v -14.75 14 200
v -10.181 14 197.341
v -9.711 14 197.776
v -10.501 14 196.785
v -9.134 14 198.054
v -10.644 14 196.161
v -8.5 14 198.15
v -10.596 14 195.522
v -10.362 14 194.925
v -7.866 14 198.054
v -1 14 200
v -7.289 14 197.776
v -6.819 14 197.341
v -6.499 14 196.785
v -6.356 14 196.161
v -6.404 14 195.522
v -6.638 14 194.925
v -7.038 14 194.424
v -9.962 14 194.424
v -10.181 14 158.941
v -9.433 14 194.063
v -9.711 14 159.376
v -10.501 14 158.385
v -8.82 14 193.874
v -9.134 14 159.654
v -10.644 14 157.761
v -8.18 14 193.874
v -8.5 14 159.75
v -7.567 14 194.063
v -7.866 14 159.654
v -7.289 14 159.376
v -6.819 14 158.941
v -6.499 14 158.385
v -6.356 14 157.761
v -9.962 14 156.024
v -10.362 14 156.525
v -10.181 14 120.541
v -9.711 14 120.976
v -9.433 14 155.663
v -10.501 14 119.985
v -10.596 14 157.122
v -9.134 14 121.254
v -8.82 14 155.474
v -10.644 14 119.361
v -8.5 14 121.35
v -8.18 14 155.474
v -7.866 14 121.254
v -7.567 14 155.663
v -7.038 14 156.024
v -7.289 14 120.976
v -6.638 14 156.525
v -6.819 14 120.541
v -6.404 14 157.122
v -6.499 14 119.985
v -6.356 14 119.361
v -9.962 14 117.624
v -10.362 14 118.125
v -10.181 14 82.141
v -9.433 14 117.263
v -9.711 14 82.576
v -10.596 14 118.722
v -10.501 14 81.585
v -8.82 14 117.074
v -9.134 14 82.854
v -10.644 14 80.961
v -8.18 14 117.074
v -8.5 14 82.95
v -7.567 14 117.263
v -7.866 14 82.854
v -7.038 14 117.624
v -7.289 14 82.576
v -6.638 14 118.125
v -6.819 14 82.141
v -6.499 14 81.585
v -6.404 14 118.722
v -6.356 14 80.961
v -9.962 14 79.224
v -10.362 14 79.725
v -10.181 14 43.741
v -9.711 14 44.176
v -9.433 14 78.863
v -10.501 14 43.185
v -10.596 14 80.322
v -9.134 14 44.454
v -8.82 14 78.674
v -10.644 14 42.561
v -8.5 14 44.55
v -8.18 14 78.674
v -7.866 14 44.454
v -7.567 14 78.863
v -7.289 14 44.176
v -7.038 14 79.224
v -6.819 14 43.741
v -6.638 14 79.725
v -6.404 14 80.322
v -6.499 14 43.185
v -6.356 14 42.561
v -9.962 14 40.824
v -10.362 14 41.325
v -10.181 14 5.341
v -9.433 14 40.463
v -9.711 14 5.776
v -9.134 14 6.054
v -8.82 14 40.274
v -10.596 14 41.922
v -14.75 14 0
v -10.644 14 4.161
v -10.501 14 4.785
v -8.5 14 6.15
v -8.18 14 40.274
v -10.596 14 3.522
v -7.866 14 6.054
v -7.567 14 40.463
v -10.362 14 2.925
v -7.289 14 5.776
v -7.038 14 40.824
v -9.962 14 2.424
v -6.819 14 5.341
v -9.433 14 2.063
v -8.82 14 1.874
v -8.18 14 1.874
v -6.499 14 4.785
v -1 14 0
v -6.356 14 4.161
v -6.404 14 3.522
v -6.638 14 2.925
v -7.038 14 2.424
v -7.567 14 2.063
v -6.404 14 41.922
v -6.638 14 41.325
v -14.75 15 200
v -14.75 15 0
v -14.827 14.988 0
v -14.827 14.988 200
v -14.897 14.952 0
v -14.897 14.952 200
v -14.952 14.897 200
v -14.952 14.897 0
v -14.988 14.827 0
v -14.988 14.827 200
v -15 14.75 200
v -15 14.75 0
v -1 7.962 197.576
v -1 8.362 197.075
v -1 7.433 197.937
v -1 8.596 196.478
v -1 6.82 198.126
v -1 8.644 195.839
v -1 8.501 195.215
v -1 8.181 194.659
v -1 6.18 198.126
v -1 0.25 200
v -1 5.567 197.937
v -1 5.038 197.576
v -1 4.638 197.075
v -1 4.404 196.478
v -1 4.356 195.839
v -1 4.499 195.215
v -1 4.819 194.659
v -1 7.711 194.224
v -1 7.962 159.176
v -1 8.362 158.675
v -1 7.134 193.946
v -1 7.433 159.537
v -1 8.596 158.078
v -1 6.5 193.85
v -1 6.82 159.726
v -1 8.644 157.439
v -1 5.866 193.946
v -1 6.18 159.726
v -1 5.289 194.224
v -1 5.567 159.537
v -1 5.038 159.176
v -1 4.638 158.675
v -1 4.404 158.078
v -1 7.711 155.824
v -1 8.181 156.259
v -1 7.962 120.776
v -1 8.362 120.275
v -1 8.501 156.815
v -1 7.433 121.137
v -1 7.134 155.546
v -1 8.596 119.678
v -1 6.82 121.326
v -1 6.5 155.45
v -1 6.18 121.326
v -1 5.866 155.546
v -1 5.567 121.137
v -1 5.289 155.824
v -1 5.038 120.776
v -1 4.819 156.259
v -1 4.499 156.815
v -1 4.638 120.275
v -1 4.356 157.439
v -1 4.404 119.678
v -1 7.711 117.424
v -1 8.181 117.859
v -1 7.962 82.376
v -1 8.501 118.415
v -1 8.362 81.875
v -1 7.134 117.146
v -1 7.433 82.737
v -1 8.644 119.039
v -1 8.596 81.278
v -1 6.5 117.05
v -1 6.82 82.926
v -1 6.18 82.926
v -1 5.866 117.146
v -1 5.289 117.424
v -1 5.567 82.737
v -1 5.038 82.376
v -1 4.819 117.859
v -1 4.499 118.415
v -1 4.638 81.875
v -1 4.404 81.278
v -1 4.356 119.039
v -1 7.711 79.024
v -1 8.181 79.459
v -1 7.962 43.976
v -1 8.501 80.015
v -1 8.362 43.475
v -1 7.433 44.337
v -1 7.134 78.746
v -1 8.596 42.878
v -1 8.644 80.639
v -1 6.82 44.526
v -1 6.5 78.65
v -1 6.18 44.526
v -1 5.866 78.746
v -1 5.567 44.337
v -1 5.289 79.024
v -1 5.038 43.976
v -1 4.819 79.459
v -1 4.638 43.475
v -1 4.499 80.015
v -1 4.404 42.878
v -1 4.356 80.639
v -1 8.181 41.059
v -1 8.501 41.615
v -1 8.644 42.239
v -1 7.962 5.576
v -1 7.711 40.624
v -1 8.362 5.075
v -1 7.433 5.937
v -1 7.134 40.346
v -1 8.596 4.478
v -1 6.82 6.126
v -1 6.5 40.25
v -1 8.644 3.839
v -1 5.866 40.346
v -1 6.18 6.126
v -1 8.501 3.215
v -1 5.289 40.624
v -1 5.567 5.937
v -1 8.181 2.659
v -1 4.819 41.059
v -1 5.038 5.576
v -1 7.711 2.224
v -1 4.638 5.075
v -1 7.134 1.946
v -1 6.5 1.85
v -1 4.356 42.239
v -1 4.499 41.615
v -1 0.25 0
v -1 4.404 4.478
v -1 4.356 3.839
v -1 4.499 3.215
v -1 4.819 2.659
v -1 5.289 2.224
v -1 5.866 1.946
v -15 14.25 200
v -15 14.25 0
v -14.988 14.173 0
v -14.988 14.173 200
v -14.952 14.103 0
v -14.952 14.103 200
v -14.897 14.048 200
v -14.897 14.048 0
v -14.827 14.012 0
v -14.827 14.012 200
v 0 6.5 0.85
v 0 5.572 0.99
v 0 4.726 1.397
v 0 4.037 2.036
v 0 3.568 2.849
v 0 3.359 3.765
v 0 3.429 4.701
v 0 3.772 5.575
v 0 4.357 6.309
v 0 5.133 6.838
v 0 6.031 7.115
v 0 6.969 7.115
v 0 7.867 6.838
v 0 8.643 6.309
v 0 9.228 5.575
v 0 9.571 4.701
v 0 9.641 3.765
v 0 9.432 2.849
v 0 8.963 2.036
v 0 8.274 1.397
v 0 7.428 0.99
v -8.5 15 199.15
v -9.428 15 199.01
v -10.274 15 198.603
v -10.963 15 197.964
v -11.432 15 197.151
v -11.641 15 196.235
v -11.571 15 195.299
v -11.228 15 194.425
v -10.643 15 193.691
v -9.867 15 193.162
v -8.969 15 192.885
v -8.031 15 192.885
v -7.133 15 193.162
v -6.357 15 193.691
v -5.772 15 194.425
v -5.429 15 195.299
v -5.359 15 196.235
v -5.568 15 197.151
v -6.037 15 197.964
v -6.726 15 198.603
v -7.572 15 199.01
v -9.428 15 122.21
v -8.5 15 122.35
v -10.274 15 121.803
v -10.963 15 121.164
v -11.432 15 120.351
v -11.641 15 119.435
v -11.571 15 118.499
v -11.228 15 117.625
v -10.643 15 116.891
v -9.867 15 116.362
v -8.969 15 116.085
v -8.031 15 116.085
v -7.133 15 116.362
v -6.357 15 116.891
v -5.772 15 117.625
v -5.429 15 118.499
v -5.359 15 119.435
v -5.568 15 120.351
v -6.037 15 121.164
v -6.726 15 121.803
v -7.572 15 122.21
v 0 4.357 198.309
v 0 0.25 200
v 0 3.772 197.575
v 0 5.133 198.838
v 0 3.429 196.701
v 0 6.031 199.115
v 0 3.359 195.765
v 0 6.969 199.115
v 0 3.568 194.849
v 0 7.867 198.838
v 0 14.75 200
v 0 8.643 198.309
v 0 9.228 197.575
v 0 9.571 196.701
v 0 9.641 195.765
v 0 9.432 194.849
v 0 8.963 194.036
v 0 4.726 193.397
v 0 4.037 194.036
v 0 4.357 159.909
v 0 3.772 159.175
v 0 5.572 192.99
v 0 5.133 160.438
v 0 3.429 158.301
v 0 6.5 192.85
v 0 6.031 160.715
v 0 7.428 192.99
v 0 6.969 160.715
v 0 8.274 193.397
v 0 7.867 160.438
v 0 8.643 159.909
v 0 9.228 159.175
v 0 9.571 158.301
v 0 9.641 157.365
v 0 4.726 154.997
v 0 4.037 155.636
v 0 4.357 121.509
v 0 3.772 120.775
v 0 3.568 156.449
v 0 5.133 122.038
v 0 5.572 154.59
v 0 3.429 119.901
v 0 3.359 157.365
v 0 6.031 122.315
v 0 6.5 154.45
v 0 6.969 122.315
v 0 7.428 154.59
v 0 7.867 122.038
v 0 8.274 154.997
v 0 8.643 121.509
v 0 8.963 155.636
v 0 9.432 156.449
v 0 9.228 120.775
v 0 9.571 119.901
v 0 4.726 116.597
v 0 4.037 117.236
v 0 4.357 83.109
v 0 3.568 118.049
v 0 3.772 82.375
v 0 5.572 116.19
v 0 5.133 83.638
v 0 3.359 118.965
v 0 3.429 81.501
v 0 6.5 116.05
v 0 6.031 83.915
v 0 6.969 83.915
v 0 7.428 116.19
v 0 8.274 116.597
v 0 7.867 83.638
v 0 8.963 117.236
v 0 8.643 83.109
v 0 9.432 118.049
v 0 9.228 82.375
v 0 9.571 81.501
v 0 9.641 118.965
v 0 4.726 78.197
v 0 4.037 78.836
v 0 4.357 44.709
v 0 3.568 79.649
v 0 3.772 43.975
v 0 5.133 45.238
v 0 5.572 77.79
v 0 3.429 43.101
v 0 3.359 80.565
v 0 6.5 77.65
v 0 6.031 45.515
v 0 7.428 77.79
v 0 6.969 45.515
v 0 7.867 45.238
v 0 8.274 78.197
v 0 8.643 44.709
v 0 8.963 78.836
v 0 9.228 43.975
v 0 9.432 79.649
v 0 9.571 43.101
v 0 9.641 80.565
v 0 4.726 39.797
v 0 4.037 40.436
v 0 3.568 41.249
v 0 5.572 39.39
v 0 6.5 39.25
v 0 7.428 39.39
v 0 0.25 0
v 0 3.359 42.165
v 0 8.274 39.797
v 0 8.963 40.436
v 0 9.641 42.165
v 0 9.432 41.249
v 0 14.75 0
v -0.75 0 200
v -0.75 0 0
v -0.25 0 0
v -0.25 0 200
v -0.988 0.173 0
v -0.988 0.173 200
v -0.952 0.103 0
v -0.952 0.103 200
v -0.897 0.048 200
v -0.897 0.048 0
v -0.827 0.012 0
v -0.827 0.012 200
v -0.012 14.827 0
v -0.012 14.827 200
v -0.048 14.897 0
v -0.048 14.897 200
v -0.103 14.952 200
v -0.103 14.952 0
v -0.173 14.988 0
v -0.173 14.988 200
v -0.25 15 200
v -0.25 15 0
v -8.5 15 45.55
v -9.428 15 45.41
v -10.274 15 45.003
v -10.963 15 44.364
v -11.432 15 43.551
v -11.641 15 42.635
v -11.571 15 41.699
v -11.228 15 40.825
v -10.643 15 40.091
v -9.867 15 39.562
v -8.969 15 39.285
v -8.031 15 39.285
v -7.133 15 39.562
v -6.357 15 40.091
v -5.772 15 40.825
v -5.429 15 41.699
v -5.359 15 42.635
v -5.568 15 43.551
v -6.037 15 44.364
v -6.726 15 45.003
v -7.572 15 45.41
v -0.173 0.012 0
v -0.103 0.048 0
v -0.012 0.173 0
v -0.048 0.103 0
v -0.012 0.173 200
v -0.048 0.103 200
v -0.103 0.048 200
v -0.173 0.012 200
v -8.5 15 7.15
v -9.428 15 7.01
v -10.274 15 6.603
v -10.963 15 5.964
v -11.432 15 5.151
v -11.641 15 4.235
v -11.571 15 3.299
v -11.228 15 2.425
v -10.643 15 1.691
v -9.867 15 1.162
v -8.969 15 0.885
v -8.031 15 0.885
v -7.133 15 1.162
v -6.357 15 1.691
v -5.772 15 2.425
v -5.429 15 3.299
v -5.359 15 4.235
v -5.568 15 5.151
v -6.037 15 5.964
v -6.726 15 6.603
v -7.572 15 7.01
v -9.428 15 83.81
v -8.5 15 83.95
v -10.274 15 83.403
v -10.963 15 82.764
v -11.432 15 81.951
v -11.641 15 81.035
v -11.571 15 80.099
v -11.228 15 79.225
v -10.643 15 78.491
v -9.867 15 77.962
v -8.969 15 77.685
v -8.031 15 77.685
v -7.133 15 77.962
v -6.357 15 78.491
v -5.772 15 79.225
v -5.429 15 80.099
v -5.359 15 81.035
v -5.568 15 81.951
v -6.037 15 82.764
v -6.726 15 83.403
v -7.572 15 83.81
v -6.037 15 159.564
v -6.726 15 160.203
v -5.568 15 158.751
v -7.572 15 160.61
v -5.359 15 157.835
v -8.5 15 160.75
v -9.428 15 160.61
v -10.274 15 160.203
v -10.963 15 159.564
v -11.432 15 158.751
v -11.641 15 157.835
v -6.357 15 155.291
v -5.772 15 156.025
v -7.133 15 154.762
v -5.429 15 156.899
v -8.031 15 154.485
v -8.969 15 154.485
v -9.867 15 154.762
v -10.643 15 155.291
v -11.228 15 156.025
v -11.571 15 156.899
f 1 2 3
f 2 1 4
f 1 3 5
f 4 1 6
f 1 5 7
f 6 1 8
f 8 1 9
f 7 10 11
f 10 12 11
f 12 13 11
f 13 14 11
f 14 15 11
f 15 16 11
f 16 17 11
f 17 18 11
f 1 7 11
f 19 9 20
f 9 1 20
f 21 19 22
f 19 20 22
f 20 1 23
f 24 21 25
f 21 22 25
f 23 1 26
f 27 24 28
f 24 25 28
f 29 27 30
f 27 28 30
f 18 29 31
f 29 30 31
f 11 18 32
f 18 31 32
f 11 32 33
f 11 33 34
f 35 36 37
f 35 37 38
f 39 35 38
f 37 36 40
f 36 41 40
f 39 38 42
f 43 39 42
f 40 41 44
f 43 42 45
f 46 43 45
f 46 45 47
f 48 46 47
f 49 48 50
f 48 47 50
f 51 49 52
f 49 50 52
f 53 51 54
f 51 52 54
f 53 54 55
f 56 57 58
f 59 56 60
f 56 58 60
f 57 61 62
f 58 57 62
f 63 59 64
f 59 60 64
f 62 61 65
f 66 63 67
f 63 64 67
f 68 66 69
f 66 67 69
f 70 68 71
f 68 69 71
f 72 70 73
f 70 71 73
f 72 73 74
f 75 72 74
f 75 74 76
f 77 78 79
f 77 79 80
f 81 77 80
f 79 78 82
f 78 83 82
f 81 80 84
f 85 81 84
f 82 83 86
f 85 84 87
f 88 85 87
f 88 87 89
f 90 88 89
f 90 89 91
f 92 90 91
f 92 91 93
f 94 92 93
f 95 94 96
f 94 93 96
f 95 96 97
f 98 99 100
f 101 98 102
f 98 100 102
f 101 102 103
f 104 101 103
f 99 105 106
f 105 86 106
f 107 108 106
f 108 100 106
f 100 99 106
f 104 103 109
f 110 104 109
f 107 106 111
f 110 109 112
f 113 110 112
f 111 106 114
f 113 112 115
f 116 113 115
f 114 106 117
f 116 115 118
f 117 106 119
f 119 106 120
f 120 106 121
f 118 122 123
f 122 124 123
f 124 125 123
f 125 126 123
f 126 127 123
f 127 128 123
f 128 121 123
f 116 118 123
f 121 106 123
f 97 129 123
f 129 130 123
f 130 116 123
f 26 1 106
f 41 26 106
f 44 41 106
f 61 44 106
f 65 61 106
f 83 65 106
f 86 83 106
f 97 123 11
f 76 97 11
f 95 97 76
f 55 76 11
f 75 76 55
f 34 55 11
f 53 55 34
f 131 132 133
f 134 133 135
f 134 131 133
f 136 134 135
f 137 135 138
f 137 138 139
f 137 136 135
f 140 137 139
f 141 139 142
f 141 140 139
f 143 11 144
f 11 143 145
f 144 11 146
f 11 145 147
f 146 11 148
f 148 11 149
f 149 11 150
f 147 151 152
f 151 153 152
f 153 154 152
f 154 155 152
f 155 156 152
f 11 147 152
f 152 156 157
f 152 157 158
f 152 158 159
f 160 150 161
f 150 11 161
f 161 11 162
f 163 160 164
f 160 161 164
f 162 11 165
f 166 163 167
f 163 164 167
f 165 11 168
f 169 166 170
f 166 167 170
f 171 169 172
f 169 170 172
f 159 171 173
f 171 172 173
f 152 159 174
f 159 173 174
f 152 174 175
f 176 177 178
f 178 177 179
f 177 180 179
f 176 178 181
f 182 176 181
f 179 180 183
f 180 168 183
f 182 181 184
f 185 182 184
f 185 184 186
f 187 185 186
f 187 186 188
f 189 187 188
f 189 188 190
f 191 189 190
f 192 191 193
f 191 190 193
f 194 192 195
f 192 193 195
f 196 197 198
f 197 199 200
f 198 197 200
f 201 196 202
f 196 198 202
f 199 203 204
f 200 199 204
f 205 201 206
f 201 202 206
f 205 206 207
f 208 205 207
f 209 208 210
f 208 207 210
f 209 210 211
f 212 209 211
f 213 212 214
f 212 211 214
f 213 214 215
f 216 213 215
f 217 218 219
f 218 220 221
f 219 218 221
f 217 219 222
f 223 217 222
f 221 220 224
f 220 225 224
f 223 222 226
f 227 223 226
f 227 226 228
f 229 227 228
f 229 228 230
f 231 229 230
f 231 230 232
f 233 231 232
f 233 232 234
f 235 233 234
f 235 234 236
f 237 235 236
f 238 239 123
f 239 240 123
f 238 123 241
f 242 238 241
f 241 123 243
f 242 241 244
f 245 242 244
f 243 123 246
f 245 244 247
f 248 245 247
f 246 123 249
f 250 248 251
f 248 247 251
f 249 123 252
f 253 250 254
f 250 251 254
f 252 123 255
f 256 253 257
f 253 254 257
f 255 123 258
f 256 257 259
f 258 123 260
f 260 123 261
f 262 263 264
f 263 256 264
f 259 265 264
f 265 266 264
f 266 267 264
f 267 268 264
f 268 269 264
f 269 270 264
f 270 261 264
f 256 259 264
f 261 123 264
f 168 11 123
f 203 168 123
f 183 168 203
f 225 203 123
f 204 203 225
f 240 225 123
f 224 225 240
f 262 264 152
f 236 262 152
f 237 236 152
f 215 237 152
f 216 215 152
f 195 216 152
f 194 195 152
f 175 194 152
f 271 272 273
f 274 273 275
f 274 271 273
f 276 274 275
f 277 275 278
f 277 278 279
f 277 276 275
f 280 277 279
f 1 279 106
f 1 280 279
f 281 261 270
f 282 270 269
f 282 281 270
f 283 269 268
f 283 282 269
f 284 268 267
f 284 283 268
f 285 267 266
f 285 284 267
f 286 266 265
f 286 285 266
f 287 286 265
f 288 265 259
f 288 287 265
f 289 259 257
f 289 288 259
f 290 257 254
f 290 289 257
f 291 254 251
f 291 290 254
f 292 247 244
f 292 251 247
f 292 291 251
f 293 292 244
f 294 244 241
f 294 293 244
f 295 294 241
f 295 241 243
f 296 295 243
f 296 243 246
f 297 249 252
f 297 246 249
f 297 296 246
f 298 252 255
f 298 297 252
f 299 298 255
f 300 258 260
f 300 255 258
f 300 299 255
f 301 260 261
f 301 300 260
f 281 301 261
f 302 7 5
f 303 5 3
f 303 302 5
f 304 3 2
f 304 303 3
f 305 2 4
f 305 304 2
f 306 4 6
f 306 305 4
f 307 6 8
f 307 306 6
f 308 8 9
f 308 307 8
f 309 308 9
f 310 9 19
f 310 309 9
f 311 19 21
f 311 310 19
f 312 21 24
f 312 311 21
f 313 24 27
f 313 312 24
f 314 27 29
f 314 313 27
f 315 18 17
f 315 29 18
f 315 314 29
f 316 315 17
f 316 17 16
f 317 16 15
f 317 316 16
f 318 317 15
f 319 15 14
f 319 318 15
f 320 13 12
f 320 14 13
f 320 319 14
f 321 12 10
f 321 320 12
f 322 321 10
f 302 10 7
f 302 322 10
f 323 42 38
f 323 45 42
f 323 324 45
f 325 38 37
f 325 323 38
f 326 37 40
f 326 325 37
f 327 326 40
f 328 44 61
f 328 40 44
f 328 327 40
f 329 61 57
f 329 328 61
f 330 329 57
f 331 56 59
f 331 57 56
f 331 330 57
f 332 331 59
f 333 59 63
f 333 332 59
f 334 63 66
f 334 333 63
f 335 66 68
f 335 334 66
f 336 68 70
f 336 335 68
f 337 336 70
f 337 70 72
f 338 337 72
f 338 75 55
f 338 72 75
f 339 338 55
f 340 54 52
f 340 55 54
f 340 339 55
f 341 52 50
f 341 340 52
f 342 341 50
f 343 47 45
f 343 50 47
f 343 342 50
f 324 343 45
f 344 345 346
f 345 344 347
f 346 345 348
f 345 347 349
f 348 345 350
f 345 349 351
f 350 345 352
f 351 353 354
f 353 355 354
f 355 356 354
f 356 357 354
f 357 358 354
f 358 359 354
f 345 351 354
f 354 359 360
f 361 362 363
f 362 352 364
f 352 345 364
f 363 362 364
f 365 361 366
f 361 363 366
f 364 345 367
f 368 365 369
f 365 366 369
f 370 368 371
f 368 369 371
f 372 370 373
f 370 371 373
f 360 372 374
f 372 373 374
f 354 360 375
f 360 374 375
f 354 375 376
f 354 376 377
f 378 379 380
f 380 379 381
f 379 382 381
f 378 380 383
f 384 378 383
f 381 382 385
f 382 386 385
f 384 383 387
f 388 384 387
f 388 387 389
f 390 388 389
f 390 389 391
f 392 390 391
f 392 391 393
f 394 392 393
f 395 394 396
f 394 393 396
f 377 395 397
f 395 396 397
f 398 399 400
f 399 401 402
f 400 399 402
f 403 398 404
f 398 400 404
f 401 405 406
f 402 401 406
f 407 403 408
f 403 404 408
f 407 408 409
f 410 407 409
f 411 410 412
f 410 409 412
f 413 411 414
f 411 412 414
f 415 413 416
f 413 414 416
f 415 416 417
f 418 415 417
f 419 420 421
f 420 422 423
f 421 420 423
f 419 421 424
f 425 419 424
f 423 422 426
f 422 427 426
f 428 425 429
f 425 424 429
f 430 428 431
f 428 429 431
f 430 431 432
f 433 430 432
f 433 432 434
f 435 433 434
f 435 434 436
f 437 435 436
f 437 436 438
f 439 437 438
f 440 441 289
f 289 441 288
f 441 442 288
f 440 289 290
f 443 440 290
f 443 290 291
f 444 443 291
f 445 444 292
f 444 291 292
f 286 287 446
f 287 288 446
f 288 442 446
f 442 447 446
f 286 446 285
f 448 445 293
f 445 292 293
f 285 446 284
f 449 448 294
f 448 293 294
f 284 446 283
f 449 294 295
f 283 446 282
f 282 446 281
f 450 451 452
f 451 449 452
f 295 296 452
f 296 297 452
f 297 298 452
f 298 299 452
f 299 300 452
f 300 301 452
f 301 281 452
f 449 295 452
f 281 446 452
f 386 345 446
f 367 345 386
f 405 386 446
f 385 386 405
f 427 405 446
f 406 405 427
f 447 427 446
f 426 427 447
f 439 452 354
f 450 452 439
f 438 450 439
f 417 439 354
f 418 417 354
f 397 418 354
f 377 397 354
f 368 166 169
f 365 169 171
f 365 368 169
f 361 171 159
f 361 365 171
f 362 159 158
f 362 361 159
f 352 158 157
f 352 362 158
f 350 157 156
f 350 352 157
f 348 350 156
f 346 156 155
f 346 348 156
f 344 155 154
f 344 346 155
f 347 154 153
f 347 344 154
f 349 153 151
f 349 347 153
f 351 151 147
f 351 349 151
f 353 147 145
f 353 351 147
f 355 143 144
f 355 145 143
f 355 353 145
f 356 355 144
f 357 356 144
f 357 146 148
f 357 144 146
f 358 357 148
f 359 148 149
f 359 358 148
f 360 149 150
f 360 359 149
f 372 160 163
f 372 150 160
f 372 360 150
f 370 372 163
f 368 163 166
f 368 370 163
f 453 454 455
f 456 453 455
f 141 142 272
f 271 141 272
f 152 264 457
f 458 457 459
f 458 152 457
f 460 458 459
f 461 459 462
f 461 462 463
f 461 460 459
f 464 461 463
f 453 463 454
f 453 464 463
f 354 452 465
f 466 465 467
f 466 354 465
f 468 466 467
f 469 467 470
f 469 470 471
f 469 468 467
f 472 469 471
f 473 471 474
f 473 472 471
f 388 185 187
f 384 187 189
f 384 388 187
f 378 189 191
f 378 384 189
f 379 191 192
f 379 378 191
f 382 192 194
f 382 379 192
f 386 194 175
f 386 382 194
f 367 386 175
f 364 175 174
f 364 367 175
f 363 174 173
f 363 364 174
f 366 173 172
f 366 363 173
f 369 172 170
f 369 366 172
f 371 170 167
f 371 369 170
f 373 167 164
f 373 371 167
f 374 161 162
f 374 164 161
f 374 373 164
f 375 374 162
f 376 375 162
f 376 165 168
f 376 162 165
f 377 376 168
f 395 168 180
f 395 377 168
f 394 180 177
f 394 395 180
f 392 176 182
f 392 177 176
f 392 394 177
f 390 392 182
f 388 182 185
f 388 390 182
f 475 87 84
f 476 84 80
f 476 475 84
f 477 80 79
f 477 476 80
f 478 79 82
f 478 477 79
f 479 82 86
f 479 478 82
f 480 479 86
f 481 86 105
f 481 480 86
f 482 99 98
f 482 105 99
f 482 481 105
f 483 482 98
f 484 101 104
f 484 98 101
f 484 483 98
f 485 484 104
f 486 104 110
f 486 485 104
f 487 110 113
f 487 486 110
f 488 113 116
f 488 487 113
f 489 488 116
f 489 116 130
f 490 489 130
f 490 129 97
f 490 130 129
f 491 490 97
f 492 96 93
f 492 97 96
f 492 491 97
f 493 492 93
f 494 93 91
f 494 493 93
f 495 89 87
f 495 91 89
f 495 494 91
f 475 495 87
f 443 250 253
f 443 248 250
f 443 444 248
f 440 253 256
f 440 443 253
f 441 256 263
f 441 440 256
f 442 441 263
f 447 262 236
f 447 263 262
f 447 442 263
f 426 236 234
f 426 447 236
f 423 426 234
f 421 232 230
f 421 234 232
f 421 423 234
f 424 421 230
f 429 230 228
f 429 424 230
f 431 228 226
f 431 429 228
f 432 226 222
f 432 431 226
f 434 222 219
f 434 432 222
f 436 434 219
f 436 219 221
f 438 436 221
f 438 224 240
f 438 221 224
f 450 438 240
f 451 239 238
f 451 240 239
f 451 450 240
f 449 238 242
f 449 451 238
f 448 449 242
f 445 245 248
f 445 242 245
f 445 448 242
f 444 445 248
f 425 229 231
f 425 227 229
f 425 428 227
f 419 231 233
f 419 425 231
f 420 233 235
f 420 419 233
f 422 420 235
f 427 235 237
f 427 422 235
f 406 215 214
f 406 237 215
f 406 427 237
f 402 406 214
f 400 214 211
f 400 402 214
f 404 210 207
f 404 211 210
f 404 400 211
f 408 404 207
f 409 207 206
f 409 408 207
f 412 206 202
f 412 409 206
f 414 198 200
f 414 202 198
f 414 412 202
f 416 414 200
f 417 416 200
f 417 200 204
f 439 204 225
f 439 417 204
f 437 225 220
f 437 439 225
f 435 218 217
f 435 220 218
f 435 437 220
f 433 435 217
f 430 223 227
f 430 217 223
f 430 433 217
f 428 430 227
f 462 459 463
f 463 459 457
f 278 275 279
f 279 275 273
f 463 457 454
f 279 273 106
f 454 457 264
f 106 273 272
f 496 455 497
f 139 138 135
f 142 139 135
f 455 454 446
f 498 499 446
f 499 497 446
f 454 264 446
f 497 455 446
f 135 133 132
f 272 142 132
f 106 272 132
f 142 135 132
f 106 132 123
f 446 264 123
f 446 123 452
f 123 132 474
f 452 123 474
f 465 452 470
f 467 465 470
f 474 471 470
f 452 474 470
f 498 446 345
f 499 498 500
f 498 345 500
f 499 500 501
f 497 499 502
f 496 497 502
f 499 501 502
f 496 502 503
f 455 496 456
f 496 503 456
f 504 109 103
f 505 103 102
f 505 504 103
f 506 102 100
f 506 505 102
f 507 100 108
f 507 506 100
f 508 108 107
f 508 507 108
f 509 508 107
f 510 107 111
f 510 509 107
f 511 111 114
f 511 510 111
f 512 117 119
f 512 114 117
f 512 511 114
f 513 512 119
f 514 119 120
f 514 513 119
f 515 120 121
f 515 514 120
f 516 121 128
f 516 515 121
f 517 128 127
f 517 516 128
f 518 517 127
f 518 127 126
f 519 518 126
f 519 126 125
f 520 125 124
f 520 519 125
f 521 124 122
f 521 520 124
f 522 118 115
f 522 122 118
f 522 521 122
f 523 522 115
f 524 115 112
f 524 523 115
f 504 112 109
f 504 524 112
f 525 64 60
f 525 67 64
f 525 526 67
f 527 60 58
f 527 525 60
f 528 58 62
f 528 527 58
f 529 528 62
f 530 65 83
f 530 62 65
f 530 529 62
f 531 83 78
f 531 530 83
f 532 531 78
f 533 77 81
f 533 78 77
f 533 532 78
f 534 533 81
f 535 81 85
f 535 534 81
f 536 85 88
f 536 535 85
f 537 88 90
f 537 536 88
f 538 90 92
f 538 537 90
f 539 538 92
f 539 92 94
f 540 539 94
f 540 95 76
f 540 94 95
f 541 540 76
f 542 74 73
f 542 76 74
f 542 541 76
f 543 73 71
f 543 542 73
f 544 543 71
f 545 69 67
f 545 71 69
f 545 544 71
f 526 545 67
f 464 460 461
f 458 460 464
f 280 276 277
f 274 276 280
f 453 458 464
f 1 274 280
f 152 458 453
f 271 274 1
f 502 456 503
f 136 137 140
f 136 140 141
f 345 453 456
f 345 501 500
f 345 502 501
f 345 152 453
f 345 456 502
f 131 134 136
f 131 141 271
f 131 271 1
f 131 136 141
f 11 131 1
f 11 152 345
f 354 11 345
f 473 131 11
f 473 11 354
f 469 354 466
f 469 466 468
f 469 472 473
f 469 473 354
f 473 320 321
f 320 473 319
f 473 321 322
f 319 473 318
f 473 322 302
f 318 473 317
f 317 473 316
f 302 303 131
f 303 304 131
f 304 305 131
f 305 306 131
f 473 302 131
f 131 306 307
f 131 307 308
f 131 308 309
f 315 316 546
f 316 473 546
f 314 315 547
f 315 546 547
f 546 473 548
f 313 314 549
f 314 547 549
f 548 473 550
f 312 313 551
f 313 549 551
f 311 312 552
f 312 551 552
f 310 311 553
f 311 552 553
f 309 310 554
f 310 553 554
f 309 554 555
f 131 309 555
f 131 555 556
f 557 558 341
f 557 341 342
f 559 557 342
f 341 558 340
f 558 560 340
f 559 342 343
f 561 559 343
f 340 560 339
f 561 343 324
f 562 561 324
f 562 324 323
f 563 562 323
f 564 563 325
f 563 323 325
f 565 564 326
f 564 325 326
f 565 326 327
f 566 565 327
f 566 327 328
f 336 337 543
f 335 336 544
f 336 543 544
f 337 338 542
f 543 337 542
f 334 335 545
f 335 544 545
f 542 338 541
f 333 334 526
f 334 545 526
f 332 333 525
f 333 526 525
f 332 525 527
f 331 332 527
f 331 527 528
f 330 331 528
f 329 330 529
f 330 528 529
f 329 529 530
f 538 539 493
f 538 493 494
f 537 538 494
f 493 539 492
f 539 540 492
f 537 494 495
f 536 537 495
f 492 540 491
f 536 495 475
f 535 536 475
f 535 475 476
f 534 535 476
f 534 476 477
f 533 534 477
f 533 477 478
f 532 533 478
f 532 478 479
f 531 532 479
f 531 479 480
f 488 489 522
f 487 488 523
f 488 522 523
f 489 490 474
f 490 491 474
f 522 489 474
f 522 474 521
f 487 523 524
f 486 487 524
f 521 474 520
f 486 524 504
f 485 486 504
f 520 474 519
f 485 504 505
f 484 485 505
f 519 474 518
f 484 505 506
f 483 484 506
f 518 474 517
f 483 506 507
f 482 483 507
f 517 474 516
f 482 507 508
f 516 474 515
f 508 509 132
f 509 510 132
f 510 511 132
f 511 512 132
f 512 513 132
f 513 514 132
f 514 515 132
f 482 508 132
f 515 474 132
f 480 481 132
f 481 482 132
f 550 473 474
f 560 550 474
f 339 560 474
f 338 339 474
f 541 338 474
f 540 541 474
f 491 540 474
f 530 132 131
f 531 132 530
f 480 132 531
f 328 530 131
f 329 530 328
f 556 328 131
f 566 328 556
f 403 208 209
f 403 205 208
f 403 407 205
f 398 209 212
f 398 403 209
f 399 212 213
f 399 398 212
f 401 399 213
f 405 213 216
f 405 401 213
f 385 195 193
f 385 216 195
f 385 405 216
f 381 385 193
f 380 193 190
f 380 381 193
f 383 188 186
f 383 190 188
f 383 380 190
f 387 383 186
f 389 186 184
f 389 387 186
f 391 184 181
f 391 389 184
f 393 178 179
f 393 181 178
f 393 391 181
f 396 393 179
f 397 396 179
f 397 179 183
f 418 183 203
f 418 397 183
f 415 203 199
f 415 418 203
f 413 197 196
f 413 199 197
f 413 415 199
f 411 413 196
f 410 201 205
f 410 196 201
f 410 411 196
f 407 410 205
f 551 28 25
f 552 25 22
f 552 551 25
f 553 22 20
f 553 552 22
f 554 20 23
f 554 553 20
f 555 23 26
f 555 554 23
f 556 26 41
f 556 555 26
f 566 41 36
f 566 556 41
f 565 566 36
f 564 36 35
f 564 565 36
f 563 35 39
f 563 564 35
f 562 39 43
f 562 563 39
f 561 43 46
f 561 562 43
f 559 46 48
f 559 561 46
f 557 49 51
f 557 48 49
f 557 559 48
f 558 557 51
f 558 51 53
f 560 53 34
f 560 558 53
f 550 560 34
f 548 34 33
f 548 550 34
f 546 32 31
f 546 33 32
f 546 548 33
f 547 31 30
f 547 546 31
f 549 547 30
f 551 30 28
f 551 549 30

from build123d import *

# Parameters (mm, degrees)
EXTRUDE1_DEPTH  = 200
FILLET1_R       = 0.25
LPATTERN1_COUNT = 6
LPATTERN1_PITCH = 38.4
LPATTERN2_COUNT = 6
LPATTERN2_PITCH = 38.4


with BuildPart() as part:
    # Sketch1 → Extrude1 (new body)
    with BuildSketch(Plane.XY):
        Polygon((0, 0), (0, 15), (-15, 15), (-15, 14), (-1, 14), (-1, 0), align=None)
    extrude(amount=EXTRUDE1_DEPTH)

    # Fillet1
    fillet1_edges = [part.edges().sort_by_distance(p)[0] for p in [
        (-15, 14, 100),
        (-15, 15, 100),
        (0, 15, 100),
        (0, 0, 100),
        (-1, 0, 100),
    ]]
    fillet(fillet1_edges, radius=FILLET1_R)

    # Sketch3 → CSK for M3 Countersunk Flat Head Screw1 (revolve, cut)
    with BuildSketch(Plane(origin=(0, 6.5, 4), x_dir=(0, 0, -1), z_dir=(0, 1, 0))):
        Polygon((0, 0), (0, 1.001), (1.7, 1.001), (1.7, 1.45), (3.15, 0), align=None)
    csk_for_m3_countersunk_flat_head_screw1 = revolve(axis=Axis((6.35, 6.5, 4), (-1, 0, 0)), mode=Mode.SUBTRACT)

    # LPattern1: CSK for M3 Countersunk Flat Head Screw1 ×6
    with Locations(*[(0, 0, i * LPATTERN1_PITCH) for i in range(1, LPATTERN1_COUNT)]):
        add(csk_for_m3_countersunk_flat_head_screw1, mode=Mode.SUBTRACT)

    # Sketch5 → CSK for M3 Countersunk Flat Head Screw2 (revolve, cut)
    with BuildSketch(Plane(origin=(-8.5, 15, 4), x_dir=(0, 0, 1), z_dir=(1, 0, 0))):
        Polygon((0, 0), (0, 1.001), (1.7, 1.001), (1.7, 1.45), (3.15, 0), align=None)
    csk_for_m3_countersunk_flat_head_screw2 = revolve(axis=Axis((-8.5, 21.35, 4), (0, -1, 0)), mode=Mode.SUBTRACT)

    # LPattern2: CSK for M3 Countersunk Flat Head Screw2 ×6
    with Locations(*[(0, 0, i * LPATTERN2_PITCH) for i in range(1, LPATTERN2_COUNT)]):
        add(csk_for_m3_countersunk_flat_head_screw2, mode=Mode.SUBTRACT)


solid = part.part
